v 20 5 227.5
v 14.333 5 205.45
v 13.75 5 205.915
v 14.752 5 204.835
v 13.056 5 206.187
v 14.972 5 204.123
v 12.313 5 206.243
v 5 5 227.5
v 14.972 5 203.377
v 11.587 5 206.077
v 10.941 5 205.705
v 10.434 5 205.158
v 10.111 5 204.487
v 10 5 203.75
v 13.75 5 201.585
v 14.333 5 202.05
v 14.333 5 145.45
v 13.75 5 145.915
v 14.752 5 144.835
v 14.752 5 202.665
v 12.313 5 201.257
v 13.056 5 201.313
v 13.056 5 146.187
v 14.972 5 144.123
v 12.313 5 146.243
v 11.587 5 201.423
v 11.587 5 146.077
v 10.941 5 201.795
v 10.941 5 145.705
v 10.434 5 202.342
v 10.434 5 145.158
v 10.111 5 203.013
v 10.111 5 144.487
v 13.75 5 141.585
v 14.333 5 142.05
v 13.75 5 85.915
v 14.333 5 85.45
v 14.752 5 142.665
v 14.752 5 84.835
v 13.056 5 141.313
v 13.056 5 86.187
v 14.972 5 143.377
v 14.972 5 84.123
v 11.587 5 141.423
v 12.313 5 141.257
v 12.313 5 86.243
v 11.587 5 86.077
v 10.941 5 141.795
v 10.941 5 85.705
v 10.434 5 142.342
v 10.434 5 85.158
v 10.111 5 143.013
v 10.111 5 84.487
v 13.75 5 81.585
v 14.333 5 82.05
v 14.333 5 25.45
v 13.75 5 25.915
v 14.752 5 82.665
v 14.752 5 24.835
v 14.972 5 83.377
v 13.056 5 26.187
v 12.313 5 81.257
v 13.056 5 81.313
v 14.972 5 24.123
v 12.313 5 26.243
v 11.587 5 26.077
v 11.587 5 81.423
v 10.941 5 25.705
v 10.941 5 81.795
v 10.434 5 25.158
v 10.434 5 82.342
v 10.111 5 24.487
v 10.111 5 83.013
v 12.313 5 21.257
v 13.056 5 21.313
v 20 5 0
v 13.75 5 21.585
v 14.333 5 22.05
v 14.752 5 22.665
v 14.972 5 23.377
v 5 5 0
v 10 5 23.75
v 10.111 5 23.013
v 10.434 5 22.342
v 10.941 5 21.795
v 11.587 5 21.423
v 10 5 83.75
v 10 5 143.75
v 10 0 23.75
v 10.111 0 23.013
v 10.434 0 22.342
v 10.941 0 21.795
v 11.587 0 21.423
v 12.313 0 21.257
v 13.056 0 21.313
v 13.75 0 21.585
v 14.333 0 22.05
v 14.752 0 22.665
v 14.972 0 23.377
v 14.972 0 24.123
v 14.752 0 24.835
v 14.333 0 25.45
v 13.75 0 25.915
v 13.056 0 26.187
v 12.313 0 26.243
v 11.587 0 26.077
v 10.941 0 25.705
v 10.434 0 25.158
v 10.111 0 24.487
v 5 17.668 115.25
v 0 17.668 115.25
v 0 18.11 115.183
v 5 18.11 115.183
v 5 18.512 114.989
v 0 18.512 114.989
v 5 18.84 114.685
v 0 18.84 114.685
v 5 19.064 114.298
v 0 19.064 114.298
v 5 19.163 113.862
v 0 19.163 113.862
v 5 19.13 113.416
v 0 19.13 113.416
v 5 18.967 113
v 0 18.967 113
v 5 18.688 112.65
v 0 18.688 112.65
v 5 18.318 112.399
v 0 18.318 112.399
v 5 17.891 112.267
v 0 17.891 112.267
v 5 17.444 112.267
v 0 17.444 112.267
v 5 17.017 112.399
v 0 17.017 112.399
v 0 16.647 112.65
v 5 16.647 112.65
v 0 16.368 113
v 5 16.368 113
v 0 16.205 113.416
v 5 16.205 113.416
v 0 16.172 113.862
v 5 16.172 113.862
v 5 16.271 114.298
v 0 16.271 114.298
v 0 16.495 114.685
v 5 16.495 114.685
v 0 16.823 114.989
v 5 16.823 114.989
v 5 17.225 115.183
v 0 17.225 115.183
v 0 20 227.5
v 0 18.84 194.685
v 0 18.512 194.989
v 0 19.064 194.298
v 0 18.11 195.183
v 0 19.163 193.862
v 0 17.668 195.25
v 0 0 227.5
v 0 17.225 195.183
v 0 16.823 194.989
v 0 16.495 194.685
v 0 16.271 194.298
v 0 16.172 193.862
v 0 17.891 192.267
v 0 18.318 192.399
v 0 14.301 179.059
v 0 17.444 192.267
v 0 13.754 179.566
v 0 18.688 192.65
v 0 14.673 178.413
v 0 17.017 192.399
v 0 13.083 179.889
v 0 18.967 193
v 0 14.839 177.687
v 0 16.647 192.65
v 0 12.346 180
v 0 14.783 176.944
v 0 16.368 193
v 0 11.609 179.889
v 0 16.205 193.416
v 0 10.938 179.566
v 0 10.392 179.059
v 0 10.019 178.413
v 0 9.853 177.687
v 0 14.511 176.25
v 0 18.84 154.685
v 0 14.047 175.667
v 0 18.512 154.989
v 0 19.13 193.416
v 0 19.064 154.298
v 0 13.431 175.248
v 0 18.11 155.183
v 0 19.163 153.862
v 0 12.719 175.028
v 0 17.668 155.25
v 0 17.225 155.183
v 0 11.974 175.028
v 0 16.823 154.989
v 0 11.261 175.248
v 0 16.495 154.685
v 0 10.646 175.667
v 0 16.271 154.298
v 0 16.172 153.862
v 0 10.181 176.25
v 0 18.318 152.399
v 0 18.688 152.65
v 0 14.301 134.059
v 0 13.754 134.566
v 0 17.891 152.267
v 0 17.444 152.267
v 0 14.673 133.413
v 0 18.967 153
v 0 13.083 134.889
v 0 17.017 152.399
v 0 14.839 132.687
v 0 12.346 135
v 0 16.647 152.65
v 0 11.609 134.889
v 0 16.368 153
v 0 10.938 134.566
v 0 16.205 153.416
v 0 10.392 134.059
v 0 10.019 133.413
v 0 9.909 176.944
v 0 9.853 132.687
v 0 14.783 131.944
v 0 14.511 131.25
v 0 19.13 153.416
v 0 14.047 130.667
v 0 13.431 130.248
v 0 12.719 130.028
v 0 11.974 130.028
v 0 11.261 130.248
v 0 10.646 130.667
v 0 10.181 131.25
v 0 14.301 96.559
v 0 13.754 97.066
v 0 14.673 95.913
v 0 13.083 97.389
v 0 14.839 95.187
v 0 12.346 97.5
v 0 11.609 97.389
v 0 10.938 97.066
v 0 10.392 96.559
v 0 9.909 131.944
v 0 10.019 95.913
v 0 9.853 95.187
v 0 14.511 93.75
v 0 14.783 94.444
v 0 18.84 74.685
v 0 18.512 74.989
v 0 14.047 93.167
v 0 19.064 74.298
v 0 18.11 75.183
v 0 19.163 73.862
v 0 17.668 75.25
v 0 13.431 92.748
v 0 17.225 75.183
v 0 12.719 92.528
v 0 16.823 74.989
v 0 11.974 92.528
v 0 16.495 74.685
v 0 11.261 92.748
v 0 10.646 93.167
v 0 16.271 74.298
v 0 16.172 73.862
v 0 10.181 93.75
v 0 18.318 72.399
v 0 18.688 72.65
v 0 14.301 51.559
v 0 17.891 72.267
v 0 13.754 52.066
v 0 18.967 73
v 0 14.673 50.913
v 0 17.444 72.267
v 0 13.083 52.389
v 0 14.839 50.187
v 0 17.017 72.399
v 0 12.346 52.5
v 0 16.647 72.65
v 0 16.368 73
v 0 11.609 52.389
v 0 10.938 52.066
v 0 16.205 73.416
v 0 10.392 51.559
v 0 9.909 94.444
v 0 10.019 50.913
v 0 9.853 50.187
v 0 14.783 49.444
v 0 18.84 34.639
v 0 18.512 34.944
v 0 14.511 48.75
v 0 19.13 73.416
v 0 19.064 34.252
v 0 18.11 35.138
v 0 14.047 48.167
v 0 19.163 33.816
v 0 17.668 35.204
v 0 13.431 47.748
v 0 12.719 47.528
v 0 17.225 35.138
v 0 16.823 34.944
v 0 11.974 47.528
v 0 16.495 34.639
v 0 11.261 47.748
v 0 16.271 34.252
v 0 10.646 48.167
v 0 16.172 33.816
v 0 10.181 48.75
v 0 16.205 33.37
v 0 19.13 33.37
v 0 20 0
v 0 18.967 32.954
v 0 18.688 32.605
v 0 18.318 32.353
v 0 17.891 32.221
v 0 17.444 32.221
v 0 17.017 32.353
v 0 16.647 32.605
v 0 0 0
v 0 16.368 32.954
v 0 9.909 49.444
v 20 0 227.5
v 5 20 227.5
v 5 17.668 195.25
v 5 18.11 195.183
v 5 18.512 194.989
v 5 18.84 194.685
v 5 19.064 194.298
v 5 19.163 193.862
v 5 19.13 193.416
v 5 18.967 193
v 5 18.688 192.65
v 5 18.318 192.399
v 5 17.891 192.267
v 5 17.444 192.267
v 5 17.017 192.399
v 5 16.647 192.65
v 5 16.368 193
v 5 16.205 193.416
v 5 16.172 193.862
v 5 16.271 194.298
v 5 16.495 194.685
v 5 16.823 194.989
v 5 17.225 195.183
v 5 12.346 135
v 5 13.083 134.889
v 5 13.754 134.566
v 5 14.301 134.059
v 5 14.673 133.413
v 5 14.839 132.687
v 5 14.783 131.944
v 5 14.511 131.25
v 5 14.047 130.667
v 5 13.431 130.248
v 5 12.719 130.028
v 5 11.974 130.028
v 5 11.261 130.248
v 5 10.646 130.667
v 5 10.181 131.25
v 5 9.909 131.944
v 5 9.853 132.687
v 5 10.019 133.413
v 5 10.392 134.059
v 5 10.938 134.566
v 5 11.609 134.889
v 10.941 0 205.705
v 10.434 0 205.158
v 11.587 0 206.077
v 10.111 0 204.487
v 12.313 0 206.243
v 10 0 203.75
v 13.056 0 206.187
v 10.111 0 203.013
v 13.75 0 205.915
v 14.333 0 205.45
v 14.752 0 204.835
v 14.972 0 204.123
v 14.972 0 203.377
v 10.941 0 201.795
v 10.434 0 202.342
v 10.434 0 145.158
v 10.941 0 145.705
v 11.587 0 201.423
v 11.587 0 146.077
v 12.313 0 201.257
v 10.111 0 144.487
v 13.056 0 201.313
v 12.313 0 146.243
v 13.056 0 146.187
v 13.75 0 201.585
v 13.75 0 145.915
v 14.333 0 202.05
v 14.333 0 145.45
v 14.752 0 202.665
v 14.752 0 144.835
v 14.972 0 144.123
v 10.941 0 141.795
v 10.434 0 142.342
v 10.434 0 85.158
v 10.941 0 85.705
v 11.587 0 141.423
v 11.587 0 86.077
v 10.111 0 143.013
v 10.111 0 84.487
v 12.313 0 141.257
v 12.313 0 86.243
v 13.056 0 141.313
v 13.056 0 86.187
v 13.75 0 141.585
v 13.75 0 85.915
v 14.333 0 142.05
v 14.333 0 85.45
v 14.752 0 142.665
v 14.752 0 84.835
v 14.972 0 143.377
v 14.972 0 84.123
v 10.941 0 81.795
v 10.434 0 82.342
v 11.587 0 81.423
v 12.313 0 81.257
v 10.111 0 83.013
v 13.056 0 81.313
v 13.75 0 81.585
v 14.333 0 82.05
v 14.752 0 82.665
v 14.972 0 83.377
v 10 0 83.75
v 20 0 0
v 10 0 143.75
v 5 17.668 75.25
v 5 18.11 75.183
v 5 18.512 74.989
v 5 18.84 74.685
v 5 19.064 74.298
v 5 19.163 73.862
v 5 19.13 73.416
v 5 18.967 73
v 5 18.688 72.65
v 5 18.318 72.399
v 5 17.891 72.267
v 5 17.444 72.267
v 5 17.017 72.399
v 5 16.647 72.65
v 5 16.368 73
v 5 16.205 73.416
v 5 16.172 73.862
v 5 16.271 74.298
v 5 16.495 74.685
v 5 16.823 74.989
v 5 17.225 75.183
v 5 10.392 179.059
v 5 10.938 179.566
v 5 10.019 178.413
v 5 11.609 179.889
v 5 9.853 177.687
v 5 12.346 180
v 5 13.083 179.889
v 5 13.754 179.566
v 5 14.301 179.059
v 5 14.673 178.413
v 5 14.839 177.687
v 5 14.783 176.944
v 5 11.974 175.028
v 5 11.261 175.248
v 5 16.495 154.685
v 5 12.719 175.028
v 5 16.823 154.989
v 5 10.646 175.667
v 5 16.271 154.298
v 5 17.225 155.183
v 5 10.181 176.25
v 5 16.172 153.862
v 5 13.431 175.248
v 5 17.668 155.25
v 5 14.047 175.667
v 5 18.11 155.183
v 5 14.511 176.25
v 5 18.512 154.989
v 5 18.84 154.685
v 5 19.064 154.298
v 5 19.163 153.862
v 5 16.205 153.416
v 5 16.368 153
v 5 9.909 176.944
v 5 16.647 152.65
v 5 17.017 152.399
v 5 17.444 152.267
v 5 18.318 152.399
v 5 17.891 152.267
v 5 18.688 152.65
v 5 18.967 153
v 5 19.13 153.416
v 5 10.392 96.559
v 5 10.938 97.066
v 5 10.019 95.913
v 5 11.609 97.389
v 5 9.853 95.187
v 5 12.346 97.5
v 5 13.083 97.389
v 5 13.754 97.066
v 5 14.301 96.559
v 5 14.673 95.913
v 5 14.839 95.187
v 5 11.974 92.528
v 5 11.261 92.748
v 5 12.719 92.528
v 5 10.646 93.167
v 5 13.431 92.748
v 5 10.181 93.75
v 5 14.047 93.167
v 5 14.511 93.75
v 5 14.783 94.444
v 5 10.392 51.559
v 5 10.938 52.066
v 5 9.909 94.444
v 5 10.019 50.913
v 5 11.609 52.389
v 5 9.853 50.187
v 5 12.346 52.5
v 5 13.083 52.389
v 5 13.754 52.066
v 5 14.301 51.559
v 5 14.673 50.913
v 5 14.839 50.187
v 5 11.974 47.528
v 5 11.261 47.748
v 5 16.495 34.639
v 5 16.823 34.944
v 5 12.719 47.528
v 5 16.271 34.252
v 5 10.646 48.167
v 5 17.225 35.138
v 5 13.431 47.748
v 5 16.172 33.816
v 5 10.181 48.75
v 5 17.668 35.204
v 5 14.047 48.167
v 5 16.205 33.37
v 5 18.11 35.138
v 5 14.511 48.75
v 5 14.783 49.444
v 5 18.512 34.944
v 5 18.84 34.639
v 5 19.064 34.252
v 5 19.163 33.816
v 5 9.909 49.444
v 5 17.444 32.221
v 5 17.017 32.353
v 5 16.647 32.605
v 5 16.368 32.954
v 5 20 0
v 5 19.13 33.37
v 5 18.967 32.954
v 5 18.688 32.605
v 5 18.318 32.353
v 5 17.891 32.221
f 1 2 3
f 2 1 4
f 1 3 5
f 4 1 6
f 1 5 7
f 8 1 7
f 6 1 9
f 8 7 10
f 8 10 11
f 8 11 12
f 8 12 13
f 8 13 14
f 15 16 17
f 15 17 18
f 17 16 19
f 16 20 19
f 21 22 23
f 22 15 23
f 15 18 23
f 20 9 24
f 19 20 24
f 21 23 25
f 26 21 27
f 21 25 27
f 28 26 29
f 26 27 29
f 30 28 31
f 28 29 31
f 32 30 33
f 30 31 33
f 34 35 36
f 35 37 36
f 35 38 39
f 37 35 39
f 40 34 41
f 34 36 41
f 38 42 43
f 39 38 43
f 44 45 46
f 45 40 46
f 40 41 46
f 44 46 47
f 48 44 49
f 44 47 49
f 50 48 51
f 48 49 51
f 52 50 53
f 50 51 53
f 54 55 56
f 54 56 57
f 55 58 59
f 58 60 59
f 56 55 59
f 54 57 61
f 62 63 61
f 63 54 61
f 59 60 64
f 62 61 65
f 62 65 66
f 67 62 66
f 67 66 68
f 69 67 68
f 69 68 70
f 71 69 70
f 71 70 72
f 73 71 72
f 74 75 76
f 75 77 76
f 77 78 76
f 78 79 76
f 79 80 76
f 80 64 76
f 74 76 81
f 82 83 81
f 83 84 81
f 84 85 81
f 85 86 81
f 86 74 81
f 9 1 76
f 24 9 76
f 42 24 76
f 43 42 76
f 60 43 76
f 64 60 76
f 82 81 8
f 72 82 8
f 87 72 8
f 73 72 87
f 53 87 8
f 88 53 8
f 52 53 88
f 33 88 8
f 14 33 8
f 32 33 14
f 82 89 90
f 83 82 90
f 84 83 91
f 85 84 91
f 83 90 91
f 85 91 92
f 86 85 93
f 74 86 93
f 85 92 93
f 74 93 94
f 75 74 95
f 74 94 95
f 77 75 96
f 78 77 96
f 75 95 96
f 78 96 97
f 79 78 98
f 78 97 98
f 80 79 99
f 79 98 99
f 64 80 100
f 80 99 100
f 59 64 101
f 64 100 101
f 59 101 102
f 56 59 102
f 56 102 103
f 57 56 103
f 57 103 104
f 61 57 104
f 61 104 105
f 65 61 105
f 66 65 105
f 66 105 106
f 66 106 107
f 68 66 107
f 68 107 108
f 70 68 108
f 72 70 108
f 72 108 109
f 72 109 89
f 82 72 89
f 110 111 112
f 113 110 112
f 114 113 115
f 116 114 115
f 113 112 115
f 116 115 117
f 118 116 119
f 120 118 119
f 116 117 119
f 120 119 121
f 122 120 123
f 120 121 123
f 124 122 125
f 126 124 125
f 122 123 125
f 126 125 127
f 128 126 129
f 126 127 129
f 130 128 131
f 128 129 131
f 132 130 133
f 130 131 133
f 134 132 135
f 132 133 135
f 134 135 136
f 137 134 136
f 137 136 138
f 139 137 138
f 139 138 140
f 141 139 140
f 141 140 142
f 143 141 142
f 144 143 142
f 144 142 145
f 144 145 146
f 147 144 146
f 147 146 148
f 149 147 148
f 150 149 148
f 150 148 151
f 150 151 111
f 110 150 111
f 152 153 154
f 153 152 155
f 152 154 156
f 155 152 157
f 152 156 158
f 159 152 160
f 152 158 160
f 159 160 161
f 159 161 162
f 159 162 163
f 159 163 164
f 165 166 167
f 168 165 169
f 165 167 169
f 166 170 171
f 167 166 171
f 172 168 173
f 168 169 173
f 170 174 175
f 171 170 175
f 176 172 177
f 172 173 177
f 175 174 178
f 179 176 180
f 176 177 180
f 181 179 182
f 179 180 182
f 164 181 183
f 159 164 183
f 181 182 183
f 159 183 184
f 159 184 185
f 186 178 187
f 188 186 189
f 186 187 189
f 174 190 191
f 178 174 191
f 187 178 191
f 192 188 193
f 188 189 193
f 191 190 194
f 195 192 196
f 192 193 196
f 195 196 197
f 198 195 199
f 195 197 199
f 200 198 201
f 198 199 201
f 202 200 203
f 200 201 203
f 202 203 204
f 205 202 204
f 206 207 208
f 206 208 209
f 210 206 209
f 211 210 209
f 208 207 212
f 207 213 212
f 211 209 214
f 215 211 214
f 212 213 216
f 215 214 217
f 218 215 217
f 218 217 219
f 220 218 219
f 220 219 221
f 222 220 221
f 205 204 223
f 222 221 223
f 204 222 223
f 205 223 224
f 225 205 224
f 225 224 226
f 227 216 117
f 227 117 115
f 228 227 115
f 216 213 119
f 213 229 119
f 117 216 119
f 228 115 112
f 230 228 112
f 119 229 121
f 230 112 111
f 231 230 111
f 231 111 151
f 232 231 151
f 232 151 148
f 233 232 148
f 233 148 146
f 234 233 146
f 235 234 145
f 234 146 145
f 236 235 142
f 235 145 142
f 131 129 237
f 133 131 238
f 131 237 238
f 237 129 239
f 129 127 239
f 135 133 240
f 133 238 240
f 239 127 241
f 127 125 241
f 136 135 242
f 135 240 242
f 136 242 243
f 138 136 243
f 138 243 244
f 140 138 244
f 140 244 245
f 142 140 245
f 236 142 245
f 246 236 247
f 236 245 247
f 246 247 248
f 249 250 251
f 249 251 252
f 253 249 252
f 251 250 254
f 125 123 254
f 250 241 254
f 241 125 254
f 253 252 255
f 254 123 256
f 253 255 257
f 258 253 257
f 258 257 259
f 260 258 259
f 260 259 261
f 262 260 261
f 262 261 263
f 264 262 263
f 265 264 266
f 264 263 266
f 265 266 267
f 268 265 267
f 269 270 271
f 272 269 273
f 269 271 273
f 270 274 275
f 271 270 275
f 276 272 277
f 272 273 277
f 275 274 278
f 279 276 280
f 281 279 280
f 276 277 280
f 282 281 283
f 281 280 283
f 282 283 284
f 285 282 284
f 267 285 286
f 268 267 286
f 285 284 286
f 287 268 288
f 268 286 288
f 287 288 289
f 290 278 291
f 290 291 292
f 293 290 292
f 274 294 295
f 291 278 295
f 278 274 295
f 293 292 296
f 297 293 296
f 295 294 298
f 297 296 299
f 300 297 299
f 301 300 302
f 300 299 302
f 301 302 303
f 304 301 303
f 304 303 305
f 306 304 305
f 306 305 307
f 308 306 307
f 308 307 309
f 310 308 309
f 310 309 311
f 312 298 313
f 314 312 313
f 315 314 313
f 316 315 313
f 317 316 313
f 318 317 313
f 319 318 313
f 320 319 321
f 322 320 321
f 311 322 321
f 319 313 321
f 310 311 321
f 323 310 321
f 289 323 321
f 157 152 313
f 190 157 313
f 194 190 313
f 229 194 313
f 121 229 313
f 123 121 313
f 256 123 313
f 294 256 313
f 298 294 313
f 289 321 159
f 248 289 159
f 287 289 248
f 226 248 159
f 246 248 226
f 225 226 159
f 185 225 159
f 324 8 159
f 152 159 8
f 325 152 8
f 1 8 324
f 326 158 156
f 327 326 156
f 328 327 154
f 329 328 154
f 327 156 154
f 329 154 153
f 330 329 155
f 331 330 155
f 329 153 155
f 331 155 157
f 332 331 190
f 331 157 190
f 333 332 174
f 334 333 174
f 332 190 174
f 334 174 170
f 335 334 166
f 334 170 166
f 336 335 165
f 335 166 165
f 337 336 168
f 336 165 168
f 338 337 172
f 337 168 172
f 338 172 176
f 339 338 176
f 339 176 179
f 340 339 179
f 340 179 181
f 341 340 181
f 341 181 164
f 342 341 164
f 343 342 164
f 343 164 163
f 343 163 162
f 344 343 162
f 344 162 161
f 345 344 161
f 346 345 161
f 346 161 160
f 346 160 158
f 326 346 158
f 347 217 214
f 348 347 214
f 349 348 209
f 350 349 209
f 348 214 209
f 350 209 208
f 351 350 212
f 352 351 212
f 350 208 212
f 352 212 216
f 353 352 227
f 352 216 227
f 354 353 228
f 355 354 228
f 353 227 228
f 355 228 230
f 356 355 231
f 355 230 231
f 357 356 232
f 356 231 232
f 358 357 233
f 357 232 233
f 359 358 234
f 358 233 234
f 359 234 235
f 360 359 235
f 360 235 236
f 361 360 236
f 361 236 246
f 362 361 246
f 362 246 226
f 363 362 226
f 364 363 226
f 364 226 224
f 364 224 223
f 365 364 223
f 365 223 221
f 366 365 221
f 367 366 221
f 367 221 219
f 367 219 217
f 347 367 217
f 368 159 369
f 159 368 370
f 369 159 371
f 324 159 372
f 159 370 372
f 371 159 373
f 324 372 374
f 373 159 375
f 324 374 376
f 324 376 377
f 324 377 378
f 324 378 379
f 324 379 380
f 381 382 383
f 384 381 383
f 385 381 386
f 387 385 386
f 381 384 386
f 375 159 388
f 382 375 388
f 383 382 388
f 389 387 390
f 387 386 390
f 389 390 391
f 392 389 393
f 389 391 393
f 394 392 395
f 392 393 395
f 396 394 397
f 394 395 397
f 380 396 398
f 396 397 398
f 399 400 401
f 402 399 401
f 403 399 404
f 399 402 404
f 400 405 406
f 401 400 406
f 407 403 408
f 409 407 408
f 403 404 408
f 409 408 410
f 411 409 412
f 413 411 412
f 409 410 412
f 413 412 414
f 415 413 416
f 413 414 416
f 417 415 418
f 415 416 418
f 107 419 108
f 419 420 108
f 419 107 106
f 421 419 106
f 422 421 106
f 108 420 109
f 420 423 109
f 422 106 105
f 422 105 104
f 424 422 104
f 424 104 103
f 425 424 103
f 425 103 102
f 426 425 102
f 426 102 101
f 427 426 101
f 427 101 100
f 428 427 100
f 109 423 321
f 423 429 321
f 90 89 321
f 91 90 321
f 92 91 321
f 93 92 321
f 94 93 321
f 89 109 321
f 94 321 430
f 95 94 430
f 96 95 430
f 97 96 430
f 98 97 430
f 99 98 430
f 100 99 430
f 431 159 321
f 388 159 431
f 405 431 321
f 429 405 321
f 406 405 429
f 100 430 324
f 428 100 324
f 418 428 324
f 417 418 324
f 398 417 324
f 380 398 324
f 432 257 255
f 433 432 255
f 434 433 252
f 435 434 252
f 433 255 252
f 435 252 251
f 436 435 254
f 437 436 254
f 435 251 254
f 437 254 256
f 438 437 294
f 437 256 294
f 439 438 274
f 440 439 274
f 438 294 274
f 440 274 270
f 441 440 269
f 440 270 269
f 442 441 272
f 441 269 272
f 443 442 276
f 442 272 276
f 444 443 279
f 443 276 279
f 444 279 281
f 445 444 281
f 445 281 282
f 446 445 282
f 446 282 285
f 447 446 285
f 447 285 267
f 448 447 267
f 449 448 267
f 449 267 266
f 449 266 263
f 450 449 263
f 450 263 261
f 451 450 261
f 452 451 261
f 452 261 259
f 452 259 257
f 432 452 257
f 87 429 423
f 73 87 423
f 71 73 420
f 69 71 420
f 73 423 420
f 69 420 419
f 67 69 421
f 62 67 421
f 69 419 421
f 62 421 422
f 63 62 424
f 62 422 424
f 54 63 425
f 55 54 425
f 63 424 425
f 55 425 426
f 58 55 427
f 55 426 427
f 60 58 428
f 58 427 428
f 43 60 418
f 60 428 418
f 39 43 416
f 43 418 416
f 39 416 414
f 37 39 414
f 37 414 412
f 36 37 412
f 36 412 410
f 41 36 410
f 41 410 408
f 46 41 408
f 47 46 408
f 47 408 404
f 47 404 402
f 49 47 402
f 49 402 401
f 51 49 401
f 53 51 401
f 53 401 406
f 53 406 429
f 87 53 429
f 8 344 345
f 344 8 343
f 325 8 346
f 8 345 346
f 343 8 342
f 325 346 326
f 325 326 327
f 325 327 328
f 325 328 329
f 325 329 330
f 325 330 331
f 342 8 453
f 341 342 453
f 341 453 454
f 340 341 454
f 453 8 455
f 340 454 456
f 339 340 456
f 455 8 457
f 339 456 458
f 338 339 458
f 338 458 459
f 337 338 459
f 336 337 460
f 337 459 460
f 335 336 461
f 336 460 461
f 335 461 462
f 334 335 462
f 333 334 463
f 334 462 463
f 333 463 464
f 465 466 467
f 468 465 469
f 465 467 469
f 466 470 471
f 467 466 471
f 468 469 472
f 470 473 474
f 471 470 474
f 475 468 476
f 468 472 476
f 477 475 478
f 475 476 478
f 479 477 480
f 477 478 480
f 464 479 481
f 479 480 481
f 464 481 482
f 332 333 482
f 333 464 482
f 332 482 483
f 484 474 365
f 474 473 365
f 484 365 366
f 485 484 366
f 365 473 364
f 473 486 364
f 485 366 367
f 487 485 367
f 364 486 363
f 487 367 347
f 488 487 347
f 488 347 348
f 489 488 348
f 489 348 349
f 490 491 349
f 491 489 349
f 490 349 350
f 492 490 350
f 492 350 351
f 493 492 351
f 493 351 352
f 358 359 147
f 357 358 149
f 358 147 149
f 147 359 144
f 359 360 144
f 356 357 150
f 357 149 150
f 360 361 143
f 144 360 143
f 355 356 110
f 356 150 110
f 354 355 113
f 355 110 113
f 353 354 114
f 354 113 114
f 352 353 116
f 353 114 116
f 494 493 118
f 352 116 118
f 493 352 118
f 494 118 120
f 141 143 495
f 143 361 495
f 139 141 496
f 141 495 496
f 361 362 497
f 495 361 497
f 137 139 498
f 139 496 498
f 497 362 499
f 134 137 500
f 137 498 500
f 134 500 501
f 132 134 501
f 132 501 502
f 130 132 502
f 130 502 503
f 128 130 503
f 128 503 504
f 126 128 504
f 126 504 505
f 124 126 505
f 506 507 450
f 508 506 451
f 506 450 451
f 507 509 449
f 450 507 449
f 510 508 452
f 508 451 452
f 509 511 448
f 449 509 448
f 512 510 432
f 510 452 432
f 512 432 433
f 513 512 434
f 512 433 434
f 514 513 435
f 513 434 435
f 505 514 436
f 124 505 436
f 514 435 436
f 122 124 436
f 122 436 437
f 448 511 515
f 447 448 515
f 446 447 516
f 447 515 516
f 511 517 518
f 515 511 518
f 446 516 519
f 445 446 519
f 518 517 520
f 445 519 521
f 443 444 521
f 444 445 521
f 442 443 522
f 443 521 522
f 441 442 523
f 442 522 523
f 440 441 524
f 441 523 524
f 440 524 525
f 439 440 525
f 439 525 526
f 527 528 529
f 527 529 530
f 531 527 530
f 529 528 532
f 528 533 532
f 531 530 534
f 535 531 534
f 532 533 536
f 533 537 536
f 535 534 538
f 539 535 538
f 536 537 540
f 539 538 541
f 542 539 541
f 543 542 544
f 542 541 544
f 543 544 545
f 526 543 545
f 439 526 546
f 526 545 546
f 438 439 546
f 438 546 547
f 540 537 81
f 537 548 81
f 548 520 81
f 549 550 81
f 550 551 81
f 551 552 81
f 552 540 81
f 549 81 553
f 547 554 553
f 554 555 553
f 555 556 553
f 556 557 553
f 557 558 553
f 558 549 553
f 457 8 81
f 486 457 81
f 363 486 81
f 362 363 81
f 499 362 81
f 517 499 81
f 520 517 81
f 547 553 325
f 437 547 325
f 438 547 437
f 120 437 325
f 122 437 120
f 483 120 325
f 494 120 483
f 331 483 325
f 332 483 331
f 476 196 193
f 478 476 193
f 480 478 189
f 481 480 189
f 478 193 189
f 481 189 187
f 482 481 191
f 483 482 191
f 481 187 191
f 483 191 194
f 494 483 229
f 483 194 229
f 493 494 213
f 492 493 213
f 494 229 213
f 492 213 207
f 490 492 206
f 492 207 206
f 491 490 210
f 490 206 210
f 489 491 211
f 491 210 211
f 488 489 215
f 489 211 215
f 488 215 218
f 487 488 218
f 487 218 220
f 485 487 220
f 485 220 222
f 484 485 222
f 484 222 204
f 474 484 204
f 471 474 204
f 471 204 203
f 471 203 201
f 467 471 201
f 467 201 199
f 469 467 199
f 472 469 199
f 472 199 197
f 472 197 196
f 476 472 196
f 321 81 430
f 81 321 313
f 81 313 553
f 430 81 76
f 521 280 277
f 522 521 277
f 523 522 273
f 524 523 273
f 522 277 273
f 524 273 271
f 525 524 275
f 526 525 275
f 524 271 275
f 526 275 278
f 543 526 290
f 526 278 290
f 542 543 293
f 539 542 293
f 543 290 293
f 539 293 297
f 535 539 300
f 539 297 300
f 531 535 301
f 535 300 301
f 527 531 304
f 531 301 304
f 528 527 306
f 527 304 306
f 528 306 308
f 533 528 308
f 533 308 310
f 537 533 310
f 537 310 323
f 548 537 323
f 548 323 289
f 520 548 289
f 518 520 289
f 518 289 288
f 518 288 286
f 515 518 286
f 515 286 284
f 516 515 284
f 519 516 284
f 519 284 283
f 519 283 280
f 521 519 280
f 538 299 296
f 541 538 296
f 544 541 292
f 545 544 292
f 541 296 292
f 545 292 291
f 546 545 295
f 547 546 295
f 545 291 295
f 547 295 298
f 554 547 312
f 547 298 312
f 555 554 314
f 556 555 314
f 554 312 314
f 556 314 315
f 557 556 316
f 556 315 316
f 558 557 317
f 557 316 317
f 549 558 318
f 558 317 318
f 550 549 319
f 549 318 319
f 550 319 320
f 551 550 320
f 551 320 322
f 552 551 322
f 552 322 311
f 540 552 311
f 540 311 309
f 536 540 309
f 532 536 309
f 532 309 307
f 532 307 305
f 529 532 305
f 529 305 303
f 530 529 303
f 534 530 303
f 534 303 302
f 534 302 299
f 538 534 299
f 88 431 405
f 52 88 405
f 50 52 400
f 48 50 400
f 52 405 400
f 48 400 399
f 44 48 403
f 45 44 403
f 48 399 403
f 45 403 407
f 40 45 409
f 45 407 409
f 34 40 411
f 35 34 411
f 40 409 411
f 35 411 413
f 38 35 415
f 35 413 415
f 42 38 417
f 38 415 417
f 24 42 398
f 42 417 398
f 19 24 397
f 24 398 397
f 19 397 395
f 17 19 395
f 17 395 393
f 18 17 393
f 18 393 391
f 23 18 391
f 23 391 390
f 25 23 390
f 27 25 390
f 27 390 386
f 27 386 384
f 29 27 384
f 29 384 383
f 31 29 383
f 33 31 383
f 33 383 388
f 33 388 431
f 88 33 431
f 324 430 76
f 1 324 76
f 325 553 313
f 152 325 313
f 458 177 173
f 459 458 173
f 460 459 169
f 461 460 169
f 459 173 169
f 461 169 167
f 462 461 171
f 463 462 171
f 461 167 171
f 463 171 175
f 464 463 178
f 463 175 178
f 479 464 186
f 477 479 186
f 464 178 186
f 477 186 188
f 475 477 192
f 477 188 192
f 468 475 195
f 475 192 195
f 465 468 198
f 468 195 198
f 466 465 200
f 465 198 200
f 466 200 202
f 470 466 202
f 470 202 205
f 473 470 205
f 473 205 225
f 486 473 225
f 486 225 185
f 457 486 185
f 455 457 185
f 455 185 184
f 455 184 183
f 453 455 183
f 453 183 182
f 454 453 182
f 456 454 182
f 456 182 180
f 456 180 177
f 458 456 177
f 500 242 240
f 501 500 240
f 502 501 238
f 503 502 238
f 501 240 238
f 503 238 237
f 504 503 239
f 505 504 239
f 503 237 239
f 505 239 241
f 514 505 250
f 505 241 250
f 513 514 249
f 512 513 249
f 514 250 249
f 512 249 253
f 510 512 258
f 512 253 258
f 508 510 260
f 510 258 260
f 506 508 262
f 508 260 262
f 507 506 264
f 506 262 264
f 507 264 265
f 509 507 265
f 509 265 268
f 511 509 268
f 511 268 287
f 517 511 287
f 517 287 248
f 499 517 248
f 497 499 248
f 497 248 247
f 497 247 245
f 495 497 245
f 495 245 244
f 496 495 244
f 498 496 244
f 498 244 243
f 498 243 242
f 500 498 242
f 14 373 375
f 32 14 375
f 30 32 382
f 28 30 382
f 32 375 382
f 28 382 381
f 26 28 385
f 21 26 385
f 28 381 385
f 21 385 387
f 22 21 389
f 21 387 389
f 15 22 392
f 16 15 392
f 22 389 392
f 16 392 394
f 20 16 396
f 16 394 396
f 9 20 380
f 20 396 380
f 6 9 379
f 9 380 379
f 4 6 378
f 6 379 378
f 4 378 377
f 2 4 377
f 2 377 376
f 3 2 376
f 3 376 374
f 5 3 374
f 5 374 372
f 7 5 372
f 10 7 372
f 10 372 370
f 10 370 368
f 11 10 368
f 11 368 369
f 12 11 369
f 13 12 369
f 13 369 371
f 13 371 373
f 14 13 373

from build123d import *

# Parameters (mm, degrees)
BOSS_EXTRUDE1_DEPTH         = 227.5
TAP_DRILL_FOR_M5X0_8_TAP1_D = 5
F_5_0_5_DIAMETER_HOLE1_D    = 5
SKETCH9_R                   = 1.5
CUT_EXTRUDE1_DEPTH          = 29


with BuildPart() as part:
    # Sketch1 → Boss-Extrude1 (new body)
    with BuildSketch(Plane.XY):
        Polygon((0, 5), (0, 0), (5, 0), (20, 0), (20, 5), (5, 5), (5, 20), (0, 20), align=None)
    extrude(amount=BOSS_EXTRUDE1_DEPTH)

    # Tap Drill for M5x0.8 Tap1 (through all)
    with Locations(Plane(origin=(0, 5, 0), x_dir=(1, 0, 0), z_dir=(0, 1, 0))):
        with Locations((12.5, -203.75), (12.5, -143.75), (12.5, -83.75), (12.5, -23.75)):
            Hole(TAP_DRILL_FOR_M5X0_8_TAP1_D / 2)

    # Ø5.0 (5) Diameter Hole1 (through all)
    with Locations(Plane(origin=(5, 0, 0), x_dir=(0, 0, -1), z_dir=(1, 0, 0))):
        with Locations((-177.5, 12.346163158), (-132.5, 12.346163158), (-95, 12.346163158), (-50, 12.346163158)):
            Hole(F_5_0_5_DIAMETER_HOLE1_D / 2)

    # Sketch9 → Cut-Extrude1 (cut)
    with BuildSketch(Plane.ZY):
        with Locations((33.704207464, 17.6675)):
            Circle(SKETCH9_R)
        with Locations((73.75, 17.6675)):
            Circle(SKETCH9_R)
        with Locations((113.75, 17.6675)):
            Circle(SKETCH9_R)
        with Locations((153.75, 17.6675)):
            Circle(SKETCH9_R)
        with Locations((193.75, 17.6675)):
            Circle(SKETCH9_R)
    extrude(amount=-CUT_EXTRUDE1_DEPTH, mode=Mode.SUBTRACT)


solid = part.part
